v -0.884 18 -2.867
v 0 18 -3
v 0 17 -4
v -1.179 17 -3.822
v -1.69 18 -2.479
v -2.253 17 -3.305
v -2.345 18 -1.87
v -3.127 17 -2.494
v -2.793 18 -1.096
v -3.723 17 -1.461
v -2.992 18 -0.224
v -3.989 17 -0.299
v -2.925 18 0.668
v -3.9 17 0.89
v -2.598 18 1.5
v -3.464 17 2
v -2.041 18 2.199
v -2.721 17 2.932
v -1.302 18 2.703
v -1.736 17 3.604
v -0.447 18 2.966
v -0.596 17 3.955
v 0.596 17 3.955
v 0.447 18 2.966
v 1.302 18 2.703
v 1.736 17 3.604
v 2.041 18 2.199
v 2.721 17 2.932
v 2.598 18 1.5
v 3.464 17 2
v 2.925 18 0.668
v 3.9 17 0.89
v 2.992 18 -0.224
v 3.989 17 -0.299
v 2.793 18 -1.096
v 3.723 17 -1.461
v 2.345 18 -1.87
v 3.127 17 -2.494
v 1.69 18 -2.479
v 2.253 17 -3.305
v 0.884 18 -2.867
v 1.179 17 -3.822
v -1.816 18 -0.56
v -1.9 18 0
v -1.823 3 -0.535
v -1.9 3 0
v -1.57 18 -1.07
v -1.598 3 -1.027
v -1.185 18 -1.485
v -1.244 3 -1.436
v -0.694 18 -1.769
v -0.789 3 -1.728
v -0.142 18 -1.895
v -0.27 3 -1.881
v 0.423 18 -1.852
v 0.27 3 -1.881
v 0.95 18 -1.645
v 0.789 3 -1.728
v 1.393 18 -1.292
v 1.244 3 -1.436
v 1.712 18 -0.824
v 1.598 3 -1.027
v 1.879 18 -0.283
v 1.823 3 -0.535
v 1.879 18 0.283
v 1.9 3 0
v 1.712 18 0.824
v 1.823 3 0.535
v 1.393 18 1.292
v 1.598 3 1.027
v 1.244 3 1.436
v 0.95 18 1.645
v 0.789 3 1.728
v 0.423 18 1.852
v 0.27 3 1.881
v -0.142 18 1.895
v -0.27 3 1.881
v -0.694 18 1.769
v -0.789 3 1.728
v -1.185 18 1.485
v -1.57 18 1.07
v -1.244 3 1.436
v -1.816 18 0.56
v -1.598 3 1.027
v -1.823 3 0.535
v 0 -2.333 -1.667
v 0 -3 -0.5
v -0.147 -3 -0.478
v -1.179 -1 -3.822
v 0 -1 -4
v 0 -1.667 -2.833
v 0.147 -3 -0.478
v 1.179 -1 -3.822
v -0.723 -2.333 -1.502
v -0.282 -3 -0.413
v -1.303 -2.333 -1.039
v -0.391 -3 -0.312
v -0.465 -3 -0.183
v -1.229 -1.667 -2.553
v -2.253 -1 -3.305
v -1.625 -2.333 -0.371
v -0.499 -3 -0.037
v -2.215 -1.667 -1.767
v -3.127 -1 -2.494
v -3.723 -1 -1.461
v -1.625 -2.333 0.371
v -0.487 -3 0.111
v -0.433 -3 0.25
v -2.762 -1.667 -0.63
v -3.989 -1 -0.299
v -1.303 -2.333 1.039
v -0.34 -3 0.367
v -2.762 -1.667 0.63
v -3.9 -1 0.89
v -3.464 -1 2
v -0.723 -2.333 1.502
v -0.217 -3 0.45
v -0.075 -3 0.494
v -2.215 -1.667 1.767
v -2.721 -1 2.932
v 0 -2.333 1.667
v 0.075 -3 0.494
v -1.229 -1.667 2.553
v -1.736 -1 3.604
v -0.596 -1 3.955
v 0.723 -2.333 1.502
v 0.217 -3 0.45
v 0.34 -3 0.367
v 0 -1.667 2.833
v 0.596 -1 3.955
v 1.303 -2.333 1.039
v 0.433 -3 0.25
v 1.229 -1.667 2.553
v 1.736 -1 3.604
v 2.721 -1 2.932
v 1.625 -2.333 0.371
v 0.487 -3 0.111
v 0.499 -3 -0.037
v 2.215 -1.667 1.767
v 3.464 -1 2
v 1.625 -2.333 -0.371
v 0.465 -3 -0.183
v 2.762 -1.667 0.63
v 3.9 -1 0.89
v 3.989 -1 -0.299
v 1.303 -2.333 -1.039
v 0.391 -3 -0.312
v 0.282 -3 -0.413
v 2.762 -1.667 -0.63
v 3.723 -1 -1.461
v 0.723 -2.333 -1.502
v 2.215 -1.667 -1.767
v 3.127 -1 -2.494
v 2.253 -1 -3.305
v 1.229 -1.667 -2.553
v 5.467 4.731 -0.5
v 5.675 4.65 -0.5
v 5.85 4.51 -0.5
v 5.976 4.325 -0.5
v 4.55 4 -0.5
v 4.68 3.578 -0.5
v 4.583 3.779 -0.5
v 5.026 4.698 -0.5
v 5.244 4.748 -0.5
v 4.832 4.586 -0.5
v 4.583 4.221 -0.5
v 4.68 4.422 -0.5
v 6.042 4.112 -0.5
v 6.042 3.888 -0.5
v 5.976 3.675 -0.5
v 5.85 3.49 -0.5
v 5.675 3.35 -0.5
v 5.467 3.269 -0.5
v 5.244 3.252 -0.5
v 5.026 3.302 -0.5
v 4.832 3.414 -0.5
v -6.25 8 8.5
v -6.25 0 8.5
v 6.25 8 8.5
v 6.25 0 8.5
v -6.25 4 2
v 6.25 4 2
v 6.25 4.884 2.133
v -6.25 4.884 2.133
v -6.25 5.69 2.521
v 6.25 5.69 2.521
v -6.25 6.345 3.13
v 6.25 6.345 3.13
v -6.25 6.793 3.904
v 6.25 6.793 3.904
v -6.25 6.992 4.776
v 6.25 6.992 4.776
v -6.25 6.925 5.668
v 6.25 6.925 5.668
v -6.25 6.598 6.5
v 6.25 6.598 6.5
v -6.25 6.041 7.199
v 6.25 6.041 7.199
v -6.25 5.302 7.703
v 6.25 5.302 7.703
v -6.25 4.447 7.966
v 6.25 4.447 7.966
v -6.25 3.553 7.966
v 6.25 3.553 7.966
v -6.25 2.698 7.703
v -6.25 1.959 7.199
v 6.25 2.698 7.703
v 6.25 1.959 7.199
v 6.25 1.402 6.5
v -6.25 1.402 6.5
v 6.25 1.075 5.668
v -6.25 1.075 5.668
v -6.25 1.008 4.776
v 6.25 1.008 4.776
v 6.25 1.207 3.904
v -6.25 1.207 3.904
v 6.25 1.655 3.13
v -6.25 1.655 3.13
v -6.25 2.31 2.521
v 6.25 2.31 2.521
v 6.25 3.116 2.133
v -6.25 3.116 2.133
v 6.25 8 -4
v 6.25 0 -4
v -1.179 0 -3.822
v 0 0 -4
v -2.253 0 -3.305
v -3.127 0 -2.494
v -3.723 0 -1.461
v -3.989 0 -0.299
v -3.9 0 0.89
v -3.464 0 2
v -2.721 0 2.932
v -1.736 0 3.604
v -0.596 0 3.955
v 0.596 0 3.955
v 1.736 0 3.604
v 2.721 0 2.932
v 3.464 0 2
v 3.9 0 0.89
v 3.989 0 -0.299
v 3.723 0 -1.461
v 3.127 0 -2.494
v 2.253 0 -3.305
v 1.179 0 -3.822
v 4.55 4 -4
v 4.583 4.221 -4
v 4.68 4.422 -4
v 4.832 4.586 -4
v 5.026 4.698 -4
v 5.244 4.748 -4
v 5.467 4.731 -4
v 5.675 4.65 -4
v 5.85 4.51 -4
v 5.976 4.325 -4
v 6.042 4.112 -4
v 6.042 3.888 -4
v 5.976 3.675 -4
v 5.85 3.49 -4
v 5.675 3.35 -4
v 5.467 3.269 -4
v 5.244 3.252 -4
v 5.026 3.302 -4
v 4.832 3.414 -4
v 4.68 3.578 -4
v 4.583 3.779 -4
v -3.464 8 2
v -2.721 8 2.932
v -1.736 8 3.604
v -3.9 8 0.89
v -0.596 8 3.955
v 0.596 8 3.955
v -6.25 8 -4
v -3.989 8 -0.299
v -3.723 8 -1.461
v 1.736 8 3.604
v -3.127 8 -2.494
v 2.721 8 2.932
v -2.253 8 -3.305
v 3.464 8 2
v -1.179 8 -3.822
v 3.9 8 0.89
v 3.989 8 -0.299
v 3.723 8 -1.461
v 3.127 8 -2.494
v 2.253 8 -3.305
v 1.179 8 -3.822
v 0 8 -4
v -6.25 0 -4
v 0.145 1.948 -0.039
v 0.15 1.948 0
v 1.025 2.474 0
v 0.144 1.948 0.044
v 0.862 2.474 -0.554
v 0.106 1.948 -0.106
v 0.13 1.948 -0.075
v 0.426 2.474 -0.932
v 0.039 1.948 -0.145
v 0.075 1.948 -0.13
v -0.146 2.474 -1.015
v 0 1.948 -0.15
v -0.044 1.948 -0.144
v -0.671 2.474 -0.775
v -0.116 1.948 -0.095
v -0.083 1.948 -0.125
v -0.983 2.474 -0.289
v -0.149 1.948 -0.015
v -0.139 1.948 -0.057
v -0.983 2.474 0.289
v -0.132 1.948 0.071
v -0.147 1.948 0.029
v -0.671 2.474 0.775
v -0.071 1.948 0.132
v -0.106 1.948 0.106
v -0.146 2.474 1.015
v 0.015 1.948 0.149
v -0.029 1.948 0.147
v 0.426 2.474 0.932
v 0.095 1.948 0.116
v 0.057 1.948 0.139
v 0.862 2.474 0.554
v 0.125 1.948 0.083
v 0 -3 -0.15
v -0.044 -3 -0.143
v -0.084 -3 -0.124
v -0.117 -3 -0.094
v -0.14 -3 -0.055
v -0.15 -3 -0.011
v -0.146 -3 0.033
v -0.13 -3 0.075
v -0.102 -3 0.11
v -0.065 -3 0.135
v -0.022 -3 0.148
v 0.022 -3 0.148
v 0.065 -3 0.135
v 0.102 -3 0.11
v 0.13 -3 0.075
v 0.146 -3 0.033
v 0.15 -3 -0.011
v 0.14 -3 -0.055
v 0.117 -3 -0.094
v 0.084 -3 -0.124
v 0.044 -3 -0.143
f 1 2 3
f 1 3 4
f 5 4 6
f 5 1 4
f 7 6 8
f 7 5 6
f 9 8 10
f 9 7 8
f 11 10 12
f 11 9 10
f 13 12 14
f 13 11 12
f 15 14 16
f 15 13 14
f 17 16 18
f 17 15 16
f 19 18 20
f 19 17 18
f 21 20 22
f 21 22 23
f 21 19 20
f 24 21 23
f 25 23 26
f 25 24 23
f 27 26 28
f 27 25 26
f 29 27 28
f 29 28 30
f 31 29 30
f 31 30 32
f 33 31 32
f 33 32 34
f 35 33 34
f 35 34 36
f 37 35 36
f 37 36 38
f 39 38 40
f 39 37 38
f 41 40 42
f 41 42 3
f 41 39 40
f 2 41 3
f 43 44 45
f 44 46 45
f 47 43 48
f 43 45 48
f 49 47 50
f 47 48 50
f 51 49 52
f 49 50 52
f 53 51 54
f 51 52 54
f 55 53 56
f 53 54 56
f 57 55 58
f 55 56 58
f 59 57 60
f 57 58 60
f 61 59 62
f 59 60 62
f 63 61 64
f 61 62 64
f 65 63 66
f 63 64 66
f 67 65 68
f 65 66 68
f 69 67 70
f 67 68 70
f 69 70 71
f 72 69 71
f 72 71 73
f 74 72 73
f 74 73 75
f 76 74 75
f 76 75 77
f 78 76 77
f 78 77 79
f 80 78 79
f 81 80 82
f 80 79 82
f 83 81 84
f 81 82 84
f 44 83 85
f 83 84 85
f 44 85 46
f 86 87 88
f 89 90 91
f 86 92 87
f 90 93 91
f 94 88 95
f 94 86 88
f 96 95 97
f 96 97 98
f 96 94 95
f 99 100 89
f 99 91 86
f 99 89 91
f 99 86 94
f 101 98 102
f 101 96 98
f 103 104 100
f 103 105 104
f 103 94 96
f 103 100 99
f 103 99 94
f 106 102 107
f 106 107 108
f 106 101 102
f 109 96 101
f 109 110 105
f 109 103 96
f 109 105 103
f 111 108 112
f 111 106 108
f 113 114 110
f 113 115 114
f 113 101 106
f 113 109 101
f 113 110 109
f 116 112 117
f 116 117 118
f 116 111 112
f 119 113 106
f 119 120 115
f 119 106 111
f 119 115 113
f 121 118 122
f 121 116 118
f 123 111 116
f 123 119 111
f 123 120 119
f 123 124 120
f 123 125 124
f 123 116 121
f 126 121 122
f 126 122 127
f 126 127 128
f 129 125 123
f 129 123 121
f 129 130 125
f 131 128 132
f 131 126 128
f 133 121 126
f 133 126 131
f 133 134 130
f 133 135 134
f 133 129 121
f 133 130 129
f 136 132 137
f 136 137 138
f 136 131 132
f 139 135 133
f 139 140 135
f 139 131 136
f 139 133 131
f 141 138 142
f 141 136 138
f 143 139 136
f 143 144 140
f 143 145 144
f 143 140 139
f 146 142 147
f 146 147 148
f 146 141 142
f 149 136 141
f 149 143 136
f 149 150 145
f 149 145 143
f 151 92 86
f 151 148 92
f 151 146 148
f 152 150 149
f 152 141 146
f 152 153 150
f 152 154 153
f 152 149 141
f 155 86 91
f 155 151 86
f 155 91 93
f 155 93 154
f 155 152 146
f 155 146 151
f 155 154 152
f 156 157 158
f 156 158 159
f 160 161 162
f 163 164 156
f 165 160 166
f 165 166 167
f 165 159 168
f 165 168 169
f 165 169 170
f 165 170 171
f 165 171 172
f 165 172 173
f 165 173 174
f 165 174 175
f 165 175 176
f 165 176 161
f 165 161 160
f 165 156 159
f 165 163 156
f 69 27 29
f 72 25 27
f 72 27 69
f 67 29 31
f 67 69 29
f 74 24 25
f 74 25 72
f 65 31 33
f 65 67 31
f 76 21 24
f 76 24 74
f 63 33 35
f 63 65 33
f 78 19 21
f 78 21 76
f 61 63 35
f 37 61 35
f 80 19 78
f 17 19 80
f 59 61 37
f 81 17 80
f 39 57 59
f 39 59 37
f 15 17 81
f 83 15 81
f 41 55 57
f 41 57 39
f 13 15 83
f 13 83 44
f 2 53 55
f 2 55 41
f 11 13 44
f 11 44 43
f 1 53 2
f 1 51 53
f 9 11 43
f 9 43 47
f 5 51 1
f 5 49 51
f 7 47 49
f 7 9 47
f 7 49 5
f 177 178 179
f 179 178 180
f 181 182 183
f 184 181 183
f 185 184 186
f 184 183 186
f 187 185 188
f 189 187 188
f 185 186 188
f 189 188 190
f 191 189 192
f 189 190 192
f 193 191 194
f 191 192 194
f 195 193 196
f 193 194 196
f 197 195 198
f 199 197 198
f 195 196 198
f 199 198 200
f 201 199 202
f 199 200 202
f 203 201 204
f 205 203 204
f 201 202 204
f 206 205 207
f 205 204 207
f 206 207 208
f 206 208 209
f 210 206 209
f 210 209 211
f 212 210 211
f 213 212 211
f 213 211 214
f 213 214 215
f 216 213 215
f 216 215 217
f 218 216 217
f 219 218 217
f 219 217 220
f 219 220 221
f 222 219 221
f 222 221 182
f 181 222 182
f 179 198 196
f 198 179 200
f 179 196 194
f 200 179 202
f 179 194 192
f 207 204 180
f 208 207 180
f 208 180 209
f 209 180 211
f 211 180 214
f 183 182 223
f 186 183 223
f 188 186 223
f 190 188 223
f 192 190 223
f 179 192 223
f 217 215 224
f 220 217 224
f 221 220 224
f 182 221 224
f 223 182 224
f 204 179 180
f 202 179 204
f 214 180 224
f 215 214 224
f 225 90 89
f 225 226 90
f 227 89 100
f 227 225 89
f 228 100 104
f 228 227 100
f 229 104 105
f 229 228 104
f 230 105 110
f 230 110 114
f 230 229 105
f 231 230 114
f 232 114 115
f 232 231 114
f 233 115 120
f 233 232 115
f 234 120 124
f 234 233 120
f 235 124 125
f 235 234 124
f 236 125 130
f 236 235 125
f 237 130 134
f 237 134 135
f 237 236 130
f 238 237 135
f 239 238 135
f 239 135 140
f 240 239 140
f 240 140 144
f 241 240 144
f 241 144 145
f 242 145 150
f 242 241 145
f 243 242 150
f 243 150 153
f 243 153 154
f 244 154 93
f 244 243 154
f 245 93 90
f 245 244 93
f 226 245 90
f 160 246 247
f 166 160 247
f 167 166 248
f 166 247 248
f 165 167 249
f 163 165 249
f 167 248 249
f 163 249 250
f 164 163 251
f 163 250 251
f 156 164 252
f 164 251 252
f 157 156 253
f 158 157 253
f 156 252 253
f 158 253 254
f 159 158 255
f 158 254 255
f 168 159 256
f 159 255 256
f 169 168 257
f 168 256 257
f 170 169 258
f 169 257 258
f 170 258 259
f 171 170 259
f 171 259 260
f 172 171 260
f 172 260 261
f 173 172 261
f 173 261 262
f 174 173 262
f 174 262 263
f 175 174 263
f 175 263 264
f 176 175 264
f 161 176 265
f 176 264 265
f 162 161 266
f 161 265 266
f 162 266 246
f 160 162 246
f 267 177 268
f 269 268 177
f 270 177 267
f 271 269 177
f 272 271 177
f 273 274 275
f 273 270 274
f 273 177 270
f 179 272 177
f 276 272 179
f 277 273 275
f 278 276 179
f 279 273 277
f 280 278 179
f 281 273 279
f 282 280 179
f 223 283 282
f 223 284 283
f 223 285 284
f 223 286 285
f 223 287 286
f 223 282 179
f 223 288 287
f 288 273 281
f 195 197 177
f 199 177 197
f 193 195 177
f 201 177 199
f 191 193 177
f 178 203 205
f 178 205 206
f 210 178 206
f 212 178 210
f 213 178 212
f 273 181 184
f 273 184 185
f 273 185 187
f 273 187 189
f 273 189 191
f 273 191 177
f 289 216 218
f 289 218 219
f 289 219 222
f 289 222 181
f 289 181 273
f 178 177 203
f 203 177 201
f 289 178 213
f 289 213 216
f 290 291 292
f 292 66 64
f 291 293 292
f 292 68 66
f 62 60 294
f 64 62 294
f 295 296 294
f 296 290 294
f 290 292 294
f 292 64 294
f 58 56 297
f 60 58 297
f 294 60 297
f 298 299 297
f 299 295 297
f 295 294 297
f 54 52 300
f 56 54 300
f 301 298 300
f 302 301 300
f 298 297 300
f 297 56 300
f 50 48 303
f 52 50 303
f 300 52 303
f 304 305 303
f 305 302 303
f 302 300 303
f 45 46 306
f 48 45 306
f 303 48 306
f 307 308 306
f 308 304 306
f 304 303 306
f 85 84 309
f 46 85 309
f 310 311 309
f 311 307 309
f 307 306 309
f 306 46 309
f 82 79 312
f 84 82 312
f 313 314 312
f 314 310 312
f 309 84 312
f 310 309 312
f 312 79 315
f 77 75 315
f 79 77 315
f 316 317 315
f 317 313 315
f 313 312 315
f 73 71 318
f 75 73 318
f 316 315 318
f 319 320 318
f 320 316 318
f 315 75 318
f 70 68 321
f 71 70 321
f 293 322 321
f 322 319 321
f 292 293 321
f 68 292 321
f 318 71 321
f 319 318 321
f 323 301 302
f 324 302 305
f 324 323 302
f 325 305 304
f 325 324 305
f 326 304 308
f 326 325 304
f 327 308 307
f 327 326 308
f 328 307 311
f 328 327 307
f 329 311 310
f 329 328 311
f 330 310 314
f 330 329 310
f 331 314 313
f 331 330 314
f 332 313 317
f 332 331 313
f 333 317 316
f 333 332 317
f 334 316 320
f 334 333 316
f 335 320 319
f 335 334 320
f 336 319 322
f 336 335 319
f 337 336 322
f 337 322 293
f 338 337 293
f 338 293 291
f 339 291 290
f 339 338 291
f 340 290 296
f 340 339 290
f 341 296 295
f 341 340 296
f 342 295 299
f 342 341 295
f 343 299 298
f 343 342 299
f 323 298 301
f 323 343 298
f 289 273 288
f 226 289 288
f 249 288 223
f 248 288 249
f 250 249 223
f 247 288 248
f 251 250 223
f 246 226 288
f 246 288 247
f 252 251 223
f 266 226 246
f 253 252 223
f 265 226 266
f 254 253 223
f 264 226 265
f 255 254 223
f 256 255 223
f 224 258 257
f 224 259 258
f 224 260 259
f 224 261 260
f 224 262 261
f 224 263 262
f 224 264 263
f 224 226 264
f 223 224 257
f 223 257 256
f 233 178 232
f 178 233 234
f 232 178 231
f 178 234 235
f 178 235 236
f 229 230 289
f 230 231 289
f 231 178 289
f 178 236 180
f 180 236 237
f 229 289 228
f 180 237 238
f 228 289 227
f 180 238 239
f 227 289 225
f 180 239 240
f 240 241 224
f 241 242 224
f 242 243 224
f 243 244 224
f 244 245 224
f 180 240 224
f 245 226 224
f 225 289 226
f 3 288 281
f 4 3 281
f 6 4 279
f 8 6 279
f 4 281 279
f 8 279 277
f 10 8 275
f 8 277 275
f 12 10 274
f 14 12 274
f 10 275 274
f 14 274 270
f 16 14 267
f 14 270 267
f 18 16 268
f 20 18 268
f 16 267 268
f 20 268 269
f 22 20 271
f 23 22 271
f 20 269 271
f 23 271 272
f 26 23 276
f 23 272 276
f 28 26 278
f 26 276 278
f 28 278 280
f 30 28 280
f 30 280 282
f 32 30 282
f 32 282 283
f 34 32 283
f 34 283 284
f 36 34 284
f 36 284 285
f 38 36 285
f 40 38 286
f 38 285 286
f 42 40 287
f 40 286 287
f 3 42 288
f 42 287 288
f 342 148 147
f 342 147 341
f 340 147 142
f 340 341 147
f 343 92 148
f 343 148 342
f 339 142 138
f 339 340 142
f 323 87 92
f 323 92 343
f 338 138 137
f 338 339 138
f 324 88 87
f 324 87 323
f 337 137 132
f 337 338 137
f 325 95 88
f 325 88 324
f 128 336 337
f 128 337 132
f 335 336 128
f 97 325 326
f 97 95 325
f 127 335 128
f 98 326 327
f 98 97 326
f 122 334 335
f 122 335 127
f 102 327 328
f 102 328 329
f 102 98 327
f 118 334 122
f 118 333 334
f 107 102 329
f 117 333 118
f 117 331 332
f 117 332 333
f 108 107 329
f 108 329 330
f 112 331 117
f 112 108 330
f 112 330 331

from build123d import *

# Parameters (mm, degrees)
SCHIZZO2_W                   = 12.5
SCHIZZO2_H                   = 12.5
SCHIZZO2_R                   = 0.15
ESTRUSIONE_ESTRUSIONE1_DEPTH = 8
SCHIZZO3_R                   = 3
TAGLIO_ESTRUSIONE1_DEPTH     = 18.102631376
SCHIZZO4_R                   = 0.75
TAGLIO_ESTRUSIONE2_DEPTH     = 3.5
SCHIZZO5_R                   = 4
ESTRUSIONE_ESTRUSIONE2_DEPTH = 10
SMUSSO1_SIZE                 = 1
FORO_3_8_3_8_1_D             = 3.8
FORO_3_8_3_8_1_DEPTH         = 15
FORO_3_8_3_8_1_TIP           = 1.141635176


with BuildPart() as part:
    # Schizzo1 → Rivoluzione1 (revolve)
    with BuildSketch(Plane.XY, mode=Mode.PRIVATE) as rivoluzione1_sk:
        Polygon((-0.15, 0), (-0.15, -3), (-0.5, -3), (-4, -1), (-4, 0), align=None)
    revolve(rivoluzione1_sk.sketch.rotate(Axis((0, -26.528171736, 0), (0, 1, 0)), 270), axis=Axis((0, -26.528171736, 0), (0, 1, 0)))

    # Schizzo2 → Estrusione-Estrusione1 (add)
    with BuildSketch(Plane(origin=(0, 0, 0), x_dir=(1, 0, 0), z_dir=(0, 1, 0))):
        with Locations((0, -2.25)):
            Rectangle(SCHIZZO2_W, SCHIZZO2_H)
        with Locations(Location((0, 0, 0), (0, 0, 90))):
            Circle(SCHIZZO2_R, mode=Mode.SUBTRACT)
    extrude(amount=ESTRUSIONE_ESTRUSIONE1_DEPTH)

    # Schizzo3 → Taglio-Estrusione1 (cut, through all)
    with BuildSketch(Plane(origin=(6.25, 0, 0), x_dir=(0, 0, -1), z_dir=(1, 0, 0))):
        with Locations((-5, 4)):
            Circle(SCHIZZO3_R)
    extrude(amount=-TAGLIO_ESTRUSIONE1_DEPTH, mode=Mode.SUBTRACT)

    # Schizzo4 → Taglio-Estrusione2 (cut)
    with BuildSketch(Plane(origin=(0, 0, -4), x_dir=(-1, 0, 0), z_dir=(0, 0, -1))):
        with Locations((-5.3, 4)):
            Circle(SCHIZZO4_R)
    extrude(amount=-TAGLIO_ESTRUSIONE2_DEPTH, mode=Mode.SUBTRACT)

    # Schizzo5 → Estrusione-Estrusione2 (add)
    with BuildSketch(Plane(origin=(0, 8, 0), x_dir=(1, 0, 0), z_dir=(0, 1, 0))):
        with Locations(Location((0, 0, 0), (0, 0, 90))):
            Circle(SCHIZZO5_R)
    extrude(amount=ESTRUSIONE_ESTRUSIONE2_DEPTH)

    # Smusso1
    smusso1_edges = [part.edges().sort_by_distance(p)[0] for p in [
        (0, 18, 4),
    ]]
    chamfer(smusso1_edges, length=SMUSSO1_SIZE)

    # Foro Ø3.8 (3.8)-1
    with Locations(Plane(origin=(0, 18, 0), x_dir=(1, 0, 0), z_dir=(0, 1, 0))):
        with Locations((0, 0)):
            Hole(FORO_3_8_3_8_1_D / 2, depth=FORO_3_8_3_8_1_DEPTH)
            with Locations((0, 0, -(FORO_3_8_3_8_1_DEPTH + FORO_3_8_3_8_1_TIP / 2))):  # 118° drill point
                Cone(0, FORO_3_8_3_8_1_D / 2, FORO_3_8_3_8_1_TIP, mode=Mode.SUBTRACT)


solid = part.part
